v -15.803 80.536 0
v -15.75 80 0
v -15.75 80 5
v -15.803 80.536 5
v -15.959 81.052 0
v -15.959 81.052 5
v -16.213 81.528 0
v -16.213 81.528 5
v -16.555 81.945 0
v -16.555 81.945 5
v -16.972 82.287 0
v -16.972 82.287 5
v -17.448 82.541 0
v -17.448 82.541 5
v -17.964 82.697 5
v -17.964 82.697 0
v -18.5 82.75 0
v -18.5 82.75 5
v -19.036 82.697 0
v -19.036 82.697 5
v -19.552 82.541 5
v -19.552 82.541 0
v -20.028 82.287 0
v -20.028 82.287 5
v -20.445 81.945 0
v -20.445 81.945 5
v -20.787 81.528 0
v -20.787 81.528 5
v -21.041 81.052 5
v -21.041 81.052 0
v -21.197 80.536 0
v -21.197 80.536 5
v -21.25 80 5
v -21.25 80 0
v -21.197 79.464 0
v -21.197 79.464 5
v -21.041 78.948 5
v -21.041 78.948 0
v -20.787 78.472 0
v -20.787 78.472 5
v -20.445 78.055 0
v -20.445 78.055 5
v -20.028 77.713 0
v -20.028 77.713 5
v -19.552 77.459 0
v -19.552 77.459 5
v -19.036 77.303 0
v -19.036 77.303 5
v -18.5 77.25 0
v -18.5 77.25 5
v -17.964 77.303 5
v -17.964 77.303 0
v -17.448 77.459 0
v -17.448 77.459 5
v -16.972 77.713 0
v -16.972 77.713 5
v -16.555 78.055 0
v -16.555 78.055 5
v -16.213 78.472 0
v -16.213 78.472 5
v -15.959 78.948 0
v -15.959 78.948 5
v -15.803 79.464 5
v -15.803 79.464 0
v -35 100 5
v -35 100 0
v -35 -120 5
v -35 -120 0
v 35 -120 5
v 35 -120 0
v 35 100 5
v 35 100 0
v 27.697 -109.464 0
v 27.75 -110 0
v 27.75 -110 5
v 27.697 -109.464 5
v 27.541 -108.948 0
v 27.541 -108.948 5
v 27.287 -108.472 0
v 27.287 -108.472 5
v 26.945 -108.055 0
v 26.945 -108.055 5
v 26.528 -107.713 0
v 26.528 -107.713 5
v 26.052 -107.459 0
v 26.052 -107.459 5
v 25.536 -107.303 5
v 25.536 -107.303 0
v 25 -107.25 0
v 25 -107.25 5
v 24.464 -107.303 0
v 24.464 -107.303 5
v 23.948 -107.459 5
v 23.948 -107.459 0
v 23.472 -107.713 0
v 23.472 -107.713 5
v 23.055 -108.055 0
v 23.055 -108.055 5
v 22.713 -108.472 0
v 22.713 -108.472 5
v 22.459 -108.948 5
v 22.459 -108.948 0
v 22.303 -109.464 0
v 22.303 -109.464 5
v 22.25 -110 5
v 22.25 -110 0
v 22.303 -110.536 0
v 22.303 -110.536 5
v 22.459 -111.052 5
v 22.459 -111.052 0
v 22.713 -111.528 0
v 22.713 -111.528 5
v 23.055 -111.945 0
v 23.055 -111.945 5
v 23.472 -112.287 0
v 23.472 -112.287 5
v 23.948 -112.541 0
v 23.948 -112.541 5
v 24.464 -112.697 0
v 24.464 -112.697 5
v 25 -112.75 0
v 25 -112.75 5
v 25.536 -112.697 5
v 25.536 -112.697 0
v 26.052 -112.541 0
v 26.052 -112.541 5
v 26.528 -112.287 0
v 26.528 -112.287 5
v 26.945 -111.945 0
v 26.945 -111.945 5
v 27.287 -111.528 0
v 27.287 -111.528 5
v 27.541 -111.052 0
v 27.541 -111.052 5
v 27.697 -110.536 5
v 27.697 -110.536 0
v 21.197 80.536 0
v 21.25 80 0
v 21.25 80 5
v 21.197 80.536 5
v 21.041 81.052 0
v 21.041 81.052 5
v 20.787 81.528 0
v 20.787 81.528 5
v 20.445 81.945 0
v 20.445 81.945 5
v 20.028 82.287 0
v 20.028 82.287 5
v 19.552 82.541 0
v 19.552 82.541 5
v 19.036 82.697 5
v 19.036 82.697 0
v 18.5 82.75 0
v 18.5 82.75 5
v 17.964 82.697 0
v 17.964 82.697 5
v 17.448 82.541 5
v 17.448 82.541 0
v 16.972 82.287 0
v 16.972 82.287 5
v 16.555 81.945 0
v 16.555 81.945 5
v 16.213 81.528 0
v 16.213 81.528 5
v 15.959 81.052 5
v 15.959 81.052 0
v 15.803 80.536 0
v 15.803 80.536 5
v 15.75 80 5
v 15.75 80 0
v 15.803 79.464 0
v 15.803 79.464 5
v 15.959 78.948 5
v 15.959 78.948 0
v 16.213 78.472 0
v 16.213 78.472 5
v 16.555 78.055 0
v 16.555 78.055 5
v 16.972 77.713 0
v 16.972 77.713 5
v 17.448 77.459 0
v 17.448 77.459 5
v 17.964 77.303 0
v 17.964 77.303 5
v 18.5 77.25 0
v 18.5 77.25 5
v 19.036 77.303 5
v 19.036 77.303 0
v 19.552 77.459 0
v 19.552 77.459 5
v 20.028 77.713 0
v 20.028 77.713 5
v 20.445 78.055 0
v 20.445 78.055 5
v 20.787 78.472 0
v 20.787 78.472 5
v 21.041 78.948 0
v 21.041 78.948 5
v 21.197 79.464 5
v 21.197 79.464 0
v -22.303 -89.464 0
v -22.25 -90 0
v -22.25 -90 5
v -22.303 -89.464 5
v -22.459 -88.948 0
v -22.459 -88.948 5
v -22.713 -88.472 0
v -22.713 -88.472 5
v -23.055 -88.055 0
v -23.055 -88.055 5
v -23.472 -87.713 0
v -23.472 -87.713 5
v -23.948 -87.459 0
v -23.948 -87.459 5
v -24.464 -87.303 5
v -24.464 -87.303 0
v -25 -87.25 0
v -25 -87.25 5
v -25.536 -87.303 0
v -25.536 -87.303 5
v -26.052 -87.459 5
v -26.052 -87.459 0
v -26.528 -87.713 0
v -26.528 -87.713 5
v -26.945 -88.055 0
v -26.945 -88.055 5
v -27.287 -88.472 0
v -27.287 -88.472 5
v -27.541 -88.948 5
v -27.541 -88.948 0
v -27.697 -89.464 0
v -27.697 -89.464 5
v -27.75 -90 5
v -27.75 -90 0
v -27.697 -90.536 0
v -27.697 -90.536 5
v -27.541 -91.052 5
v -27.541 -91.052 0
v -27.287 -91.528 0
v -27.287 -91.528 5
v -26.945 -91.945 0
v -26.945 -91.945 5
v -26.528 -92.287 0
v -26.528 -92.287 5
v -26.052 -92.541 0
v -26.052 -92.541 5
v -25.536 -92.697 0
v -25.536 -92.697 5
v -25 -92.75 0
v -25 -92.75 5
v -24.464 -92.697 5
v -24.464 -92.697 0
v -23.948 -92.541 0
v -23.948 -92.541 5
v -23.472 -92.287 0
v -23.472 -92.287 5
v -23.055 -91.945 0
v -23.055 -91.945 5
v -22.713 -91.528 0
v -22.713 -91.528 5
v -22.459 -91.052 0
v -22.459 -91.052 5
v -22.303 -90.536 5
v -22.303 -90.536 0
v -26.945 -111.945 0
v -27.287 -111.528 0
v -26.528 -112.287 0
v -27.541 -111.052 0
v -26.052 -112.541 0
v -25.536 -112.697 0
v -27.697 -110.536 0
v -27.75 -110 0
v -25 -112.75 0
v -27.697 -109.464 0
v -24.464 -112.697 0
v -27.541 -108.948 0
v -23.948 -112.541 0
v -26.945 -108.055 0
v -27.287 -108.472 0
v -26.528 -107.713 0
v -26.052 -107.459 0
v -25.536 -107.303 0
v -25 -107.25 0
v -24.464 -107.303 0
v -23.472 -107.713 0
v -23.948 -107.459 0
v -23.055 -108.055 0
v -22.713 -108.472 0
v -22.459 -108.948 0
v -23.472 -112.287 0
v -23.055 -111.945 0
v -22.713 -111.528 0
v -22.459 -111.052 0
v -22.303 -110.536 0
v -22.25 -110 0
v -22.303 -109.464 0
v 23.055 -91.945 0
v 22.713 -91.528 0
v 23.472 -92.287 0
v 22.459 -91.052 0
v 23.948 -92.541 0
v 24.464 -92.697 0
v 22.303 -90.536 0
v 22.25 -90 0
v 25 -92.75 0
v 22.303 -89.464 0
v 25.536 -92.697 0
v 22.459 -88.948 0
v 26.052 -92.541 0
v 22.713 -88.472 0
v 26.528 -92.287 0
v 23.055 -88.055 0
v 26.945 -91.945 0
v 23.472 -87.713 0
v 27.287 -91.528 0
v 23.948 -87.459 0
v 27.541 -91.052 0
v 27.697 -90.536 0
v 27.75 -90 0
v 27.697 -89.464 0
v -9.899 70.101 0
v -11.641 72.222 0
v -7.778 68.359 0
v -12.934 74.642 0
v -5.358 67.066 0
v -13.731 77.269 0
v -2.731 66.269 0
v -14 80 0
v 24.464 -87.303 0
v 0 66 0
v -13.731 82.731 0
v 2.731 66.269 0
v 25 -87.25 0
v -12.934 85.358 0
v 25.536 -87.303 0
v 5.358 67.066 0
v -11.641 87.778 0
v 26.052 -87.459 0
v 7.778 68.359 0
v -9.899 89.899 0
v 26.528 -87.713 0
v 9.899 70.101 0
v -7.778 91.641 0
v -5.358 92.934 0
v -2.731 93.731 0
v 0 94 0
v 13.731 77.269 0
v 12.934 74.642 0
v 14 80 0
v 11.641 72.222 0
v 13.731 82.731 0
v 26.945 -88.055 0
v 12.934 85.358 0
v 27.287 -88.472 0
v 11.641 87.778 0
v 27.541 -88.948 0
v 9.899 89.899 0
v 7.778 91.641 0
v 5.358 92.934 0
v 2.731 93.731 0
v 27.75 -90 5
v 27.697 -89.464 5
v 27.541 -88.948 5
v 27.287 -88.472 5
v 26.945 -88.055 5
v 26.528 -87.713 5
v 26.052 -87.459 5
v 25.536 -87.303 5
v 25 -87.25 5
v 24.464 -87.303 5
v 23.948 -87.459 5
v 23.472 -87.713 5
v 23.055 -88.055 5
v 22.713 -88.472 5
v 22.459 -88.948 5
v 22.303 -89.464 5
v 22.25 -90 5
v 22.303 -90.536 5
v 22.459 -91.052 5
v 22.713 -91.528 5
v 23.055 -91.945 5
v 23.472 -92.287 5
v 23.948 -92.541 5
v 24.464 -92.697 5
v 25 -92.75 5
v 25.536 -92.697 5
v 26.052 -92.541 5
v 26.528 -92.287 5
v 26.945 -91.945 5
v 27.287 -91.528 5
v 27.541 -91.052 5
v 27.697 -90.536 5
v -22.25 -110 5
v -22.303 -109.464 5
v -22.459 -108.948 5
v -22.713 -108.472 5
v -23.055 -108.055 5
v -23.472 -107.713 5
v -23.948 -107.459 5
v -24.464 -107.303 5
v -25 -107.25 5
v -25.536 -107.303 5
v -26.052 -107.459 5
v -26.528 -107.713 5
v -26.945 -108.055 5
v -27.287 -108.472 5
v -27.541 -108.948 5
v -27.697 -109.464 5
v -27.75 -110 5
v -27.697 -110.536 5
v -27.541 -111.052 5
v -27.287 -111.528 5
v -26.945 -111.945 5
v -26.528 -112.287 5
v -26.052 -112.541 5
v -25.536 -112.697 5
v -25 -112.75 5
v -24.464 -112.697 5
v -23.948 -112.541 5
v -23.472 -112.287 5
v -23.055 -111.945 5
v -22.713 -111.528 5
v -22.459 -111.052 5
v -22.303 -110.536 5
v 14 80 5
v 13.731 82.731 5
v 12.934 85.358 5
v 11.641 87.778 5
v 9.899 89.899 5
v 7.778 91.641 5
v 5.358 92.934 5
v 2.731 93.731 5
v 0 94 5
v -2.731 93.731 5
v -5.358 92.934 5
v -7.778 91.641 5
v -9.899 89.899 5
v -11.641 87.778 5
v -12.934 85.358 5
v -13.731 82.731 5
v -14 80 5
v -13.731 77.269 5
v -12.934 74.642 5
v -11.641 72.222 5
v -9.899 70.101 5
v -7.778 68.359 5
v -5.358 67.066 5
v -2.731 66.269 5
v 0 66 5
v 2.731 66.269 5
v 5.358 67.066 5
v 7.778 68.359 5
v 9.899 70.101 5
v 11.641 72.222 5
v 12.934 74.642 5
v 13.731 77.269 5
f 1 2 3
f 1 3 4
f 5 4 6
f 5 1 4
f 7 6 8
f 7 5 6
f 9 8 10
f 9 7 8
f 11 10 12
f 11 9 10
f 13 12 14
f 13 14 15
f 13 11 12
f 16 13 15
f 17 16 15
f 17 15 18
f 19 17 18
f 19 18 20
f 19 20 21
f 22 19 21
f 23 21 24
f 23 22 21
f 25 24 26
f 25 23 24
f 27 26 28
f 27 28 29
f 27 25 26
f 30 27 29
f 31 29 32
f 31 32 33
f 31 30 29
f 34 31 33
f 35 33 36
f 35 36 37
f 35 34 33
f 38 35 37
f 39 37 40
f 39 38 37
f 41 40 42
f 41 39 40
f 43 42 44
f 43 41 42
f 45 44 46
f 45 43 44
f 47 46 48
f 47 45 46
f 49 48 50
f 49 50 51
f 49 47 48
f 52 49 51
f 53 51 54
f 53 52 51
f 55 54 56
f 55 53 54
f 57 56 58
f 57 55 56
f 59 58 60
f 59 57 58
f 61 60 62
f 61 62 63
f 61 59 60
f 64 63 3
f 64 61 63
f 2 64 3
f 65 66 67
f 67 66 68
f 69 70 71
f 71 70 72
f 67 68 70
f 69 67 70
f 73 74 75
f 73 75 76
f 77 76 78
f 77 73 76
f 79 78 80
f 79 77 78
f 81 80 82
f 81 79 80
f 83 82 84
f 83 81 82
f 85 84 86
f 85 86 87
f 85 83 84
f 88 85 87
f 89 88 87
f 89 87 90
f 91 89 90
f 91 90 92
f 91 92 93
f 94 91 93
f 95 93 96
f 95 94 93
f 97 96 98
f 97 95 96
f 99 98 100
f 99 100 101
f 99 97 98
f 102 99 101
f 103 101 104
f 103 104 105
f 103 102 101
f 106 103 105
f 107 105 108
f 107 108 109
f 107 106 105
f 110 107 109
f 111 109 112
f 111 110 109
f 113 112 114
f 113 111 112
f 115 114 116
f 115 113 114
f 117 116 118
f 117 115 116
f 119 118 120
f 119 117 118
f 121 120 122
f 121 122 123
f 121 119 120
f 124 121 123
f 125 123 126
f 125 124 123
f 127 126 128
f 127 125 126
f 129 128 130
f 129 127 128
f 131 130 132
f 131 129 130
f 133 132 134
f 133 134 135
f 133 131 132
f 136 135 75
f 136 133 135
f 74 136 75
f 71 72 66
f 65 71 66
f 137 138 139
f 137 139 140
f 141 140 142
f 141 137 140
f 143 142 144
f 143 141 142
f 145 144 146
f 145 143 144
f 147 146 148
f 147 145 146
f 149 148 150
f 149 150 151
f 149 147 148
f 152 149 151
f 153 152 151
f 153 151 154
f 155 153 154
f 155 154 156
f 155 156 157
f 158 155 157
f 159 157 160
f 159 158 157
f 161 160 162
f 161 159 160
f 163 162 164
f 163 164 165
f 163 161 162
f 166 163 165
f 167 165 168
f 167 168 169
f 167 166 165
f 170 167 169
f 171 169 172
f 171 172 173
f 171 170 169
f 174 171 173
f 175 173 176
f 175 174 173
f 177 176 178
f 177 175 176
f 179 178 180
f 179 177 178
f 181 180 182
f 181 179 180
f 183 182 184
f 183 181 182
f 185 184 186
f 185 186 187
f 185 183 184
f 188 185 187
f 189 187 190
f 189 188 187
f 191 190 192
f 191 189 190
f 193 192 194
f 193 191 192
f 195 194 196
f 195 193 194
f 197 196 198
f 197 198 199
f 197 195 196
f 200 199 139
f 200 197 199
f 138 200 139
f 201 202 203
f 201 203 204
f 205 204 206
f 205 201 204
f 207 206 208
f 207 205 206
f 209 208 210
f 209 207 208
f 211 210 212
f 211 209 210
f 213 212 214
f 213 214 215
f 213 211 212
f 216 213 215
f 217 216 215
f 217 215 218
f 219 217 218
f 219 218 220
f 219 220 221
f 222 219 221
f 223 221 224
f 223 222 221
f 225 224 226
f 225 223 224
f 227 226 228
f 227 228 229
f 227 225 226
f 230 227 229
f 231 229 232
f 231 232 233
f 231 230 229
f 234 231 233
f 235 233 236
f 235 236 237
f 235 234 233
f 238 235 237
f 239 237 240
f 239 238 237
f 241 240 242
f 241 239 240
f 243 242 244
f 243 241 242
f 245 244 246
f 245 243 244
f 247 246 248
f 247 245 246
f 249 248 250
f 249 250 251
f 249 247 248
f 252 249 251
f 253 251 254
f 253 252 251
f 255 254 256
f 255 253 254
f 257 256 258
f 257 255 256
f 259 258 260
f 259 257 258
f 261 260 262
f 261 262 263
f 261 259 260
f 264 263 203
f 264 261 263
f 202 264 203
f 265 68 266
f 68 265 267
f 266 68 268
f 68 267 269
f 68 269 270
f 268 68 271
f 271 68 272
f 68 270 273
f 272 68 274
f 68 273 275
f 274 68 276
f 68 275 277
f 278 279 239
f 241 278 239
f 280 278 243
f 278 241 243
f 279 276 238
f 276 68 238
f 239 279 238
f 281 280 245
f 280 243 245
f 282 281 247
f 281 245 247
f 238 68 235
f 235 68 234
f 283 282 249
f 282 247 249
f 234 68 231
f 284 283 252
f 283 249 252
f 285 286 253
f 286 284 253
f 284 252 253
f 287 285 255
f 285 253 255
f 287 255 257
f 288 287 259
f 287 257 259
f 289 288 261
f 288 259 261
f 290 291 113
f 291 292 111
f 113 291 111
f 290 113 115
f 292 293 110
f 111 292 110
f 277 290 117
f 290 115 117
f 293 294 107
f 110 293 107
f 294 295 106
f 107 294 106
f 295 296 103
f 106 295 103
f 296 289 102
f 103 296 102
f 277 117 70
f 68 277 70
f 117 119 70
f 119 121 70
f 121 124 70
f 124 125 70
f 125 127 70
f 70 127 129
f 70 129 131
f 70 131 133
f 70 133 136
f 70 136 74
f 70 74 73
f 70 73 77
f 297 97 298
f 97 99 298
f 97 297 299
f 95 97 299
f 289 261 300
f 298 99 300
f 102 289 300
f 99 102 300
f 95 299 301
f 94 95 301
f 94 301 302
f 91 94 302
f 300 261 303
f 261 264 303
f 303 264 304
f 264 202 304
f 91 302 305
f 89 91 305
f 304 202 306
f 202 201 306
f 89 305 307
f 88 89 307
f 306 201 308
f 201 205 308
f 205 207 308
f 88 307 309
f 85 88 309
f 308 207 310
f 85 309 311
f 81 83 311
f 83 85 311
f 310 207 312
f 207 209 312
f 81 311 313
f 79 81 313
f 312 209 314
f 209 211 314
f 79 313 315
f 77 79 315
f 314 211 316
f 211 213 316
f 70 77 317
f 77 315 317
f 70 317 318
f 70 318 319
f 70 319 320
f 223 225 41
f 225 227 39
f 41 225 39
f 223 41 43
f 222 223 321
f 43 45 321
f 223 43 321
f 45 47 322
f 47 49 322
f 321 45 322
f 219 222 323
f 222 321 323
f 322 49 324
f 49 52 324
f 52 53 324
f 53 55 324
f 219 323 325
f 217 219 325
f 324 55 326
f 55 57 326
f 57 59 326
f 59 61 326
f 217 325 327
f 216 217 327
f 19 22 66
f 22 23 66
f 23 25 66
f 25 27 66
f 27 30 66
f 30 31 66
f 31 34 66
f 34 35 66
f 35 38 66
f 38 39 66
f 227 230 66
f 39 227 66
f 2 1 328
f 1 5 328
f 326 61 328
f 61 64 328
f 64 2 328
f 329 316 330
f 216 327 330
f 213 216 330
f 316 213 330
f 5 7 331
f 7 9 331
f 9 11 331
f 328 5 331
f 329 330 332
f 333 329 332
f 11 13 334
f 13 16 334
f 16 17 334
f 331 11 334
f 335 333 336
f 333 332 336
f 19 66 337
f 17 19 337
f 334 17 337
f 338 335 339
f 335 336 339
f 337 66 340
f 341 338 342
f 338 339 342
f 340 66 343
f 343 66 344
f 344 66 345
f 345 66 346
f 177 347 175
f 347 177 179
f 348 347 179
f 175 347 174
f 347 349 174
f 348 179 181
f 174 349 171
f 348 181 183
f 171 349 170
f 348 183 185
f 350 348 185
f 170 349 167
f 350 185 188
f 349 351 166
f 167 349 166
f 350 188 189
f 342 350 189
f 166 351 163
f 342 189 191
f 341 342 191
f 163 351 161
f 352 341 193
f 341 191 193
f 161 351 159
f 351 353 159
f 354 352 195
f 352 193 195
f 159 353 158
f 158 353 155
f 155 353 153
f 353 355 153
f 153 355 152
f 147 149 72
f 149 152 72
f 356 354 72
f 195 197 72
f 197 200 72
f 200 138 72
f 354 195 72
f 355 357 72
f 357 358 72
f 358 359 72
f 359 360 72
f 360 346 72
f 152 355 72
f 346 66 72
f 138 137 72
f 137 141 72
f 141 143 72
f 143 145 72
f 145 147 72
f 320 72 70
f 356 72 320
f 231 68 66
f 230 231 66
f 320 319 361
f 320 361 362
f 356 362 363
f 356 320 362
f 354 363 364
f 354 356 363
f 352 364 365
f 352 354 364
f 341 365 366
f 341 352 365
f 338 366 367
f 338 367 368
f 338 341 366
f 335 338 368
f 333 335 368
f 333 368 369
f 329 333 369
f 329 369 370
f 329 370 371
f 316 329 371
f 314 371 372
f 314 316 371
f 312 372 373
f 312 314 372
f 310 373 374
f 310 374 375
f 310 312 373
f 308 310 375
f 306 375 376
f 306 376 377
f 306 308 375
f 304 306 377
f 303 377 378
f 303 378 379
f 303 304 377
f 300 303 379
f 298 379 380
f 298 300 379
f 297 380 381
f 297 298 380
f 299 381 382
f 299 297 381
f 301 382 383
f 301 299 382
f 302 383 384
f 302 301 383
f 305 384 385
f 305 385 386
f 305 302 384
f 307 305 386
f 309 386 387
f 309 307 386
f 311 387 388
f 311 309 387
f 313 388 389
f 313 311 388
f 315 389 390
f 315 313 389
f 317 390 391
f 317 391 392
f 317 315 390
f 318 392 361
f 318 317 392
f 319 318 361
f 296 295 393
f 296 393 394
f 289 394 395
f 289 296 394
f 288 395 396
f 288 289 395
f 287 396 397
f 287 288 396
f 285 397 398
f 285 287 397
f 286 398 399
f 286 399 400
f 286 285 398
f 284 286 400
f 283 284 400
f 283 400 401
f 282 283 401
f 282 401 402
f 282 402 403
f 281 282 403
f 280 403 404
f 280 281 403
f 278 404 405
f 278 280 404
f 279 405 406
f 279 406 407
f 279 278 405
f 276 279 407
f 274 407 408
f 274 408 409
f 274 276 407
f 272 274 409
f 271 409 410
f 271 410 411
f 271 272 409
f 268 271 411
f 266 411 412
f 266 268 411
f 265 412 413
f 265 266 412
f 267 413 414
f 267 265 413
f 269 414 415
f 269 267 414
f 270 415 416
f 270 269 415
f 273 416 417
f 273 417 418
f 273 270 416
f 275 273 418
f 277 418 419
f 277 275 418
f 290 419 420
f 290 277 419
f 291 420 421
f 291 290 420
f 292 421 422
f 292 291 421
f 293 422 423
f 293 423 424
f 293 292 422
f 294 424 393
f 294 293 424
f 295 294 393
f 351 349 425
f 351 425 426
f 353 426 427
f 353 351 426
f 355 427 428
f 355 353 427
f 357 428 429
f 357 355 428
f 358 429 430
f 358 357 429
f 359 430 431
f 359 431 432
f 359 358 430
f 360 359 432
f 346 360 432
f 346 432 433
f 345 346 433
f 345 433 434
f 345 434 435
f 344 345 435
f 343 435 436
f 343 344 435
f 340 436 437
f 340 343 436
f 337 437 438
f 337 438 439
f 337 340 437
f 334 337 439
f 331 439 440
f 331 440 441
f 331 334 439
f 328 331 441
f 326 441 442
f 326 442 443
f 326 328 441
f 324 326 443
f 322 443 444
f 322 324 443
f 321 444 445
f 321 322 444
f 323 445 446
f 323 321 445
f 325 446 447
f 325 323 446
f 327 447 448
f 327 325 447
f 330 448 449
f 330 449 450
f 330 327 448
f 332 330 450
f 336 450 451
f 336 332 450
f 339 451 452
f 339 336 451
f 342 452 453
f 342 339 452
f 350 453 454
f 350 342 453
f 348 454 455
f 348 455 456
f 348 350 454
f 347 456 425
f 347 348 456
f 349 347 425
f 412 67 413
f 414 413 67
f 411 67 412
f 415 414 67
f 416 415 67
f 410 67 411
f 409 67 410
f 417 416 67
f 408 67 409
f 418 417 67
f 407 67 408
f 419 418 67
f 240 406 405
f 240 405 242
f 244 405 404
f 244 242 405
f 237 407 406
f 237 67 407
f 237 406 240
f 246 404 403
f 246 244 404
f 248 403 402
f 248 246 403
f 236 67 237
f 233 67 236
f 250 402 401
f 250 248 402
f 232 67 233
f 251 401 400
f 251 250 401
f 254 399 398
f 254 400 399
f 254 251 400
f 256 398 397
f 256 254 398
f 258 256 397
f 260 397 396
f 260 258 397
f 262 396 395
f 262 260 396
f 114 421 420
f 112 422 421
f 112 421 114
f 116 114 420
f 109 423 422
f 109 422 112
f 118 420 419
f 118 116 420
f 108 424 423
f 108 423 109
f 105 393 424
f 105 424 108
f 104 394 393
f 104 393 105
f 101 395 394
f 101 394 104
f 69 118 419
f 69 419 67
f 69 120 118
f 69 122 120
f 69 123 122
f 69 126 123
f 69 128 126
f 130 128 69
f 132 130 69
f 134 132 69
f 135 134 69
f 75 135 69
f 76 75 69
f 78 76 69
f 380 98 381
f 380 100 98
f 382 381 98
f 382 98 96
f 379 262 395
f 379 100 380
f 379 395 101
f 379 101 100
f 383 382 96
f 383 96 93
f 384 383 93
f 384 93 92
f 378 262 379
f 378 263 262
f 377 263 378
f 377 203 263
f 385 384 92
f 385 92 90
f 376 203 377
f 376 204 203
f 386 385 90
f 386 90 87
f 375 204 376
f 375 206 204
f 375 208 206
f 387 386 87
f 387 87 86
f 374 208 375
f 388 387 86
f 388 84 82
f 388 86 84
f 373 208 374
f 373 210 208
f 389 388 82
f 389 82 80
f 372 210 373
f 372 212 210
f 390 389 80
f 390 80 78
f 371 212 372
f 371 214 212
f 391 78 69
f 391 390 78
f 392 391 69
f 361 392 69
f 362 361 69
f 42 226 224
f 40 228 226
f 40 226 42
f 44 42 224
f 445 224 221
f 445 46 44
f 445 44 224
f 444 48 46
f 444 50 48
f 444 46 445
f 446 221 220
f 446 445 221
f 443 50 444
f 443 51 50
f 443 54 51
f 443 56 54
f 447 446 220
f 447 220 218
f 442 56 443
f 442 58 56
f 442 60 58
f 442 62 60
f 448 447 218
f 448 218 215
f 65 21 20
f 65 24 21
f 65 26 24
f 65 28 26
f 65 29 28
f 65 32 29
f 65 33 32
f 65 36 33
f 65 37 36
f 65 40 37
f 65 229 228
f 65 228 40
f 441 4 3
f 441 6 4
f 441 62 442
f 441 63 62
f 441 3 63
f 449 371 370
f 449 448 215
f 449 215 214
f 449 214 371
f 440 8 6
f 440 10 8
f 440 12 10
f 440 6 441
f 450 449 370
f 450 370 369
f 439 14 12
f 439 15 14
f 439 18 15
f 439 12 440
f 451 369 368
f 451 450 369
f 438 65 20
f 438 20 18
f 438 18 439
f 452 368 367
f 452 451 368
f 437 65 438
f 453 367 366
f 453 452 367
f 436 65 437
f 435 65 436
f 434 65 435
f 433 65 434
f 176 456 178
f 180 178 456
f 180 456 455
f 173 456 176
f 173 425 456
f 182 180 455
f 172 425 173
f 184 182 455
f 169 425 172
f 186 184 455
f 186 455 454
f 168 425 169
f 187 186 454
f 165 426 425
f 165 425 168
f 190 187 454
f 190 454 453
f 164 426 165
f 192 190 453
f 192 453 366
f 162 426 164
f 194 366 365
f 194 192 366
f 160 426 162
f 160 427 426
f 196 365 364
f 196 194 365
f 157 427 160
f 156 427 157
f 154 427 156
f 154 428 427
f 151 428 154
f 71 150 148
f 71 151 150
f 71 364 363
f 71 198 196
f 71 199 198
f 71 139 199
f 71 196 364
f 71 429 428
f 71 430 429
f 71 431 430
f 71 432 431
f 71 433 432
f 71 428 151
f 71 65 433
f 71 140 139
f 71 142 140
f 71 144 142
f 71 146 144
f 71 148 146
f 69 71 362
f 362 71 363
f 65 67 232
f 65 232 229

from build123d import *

# Parameters (mm, degrees)
SKETCH1_R           = 14
SKETCH1_R_2         = 2.75
BOSS_EXTRUDE1_DEPTH = 5


with BuildPart() as part:
    # Sketch1 → Boss-Extrude1 (new body)
    with BuildSketch(Plane.XY):
        Polygon((-35, -120), (35, -120), (35, -100), (35, 100), (-35, 100), (-35, -100), align=None)
        with Locations((0, 80)):
            Circle(SKETCH1_R, mode=Mode.SUBTRACT)
        with Locations((-25, -110)):
            Circle(SKETCH1_R_2, mode=Mode.SUBTRACT)
        with Locations((25, -110)):
            Circle(SKETCH1_R_2, mode=Mode.SUBTRACT)
        with Locations((25, -90)):
            Circle(SKETCH1_R_2, mode=Mode.SUBTRACT)
        with Locations((-25, -90)):
            Circle(SKETCH1_R_2, mode=Mode.SUBTRACT)
        with Locations((18.5, 80)):
            Circle(SKETCH1_R_2, mode=Mode.SUBTRACT)
        with Locations((-18.5, 80)):
            Circle(SKETCH1_R_2, mode=Mode.SUBTRACT)
    extrude(amount=BOSS_EXTRUDE1_DEPTH)


solid = part.part
